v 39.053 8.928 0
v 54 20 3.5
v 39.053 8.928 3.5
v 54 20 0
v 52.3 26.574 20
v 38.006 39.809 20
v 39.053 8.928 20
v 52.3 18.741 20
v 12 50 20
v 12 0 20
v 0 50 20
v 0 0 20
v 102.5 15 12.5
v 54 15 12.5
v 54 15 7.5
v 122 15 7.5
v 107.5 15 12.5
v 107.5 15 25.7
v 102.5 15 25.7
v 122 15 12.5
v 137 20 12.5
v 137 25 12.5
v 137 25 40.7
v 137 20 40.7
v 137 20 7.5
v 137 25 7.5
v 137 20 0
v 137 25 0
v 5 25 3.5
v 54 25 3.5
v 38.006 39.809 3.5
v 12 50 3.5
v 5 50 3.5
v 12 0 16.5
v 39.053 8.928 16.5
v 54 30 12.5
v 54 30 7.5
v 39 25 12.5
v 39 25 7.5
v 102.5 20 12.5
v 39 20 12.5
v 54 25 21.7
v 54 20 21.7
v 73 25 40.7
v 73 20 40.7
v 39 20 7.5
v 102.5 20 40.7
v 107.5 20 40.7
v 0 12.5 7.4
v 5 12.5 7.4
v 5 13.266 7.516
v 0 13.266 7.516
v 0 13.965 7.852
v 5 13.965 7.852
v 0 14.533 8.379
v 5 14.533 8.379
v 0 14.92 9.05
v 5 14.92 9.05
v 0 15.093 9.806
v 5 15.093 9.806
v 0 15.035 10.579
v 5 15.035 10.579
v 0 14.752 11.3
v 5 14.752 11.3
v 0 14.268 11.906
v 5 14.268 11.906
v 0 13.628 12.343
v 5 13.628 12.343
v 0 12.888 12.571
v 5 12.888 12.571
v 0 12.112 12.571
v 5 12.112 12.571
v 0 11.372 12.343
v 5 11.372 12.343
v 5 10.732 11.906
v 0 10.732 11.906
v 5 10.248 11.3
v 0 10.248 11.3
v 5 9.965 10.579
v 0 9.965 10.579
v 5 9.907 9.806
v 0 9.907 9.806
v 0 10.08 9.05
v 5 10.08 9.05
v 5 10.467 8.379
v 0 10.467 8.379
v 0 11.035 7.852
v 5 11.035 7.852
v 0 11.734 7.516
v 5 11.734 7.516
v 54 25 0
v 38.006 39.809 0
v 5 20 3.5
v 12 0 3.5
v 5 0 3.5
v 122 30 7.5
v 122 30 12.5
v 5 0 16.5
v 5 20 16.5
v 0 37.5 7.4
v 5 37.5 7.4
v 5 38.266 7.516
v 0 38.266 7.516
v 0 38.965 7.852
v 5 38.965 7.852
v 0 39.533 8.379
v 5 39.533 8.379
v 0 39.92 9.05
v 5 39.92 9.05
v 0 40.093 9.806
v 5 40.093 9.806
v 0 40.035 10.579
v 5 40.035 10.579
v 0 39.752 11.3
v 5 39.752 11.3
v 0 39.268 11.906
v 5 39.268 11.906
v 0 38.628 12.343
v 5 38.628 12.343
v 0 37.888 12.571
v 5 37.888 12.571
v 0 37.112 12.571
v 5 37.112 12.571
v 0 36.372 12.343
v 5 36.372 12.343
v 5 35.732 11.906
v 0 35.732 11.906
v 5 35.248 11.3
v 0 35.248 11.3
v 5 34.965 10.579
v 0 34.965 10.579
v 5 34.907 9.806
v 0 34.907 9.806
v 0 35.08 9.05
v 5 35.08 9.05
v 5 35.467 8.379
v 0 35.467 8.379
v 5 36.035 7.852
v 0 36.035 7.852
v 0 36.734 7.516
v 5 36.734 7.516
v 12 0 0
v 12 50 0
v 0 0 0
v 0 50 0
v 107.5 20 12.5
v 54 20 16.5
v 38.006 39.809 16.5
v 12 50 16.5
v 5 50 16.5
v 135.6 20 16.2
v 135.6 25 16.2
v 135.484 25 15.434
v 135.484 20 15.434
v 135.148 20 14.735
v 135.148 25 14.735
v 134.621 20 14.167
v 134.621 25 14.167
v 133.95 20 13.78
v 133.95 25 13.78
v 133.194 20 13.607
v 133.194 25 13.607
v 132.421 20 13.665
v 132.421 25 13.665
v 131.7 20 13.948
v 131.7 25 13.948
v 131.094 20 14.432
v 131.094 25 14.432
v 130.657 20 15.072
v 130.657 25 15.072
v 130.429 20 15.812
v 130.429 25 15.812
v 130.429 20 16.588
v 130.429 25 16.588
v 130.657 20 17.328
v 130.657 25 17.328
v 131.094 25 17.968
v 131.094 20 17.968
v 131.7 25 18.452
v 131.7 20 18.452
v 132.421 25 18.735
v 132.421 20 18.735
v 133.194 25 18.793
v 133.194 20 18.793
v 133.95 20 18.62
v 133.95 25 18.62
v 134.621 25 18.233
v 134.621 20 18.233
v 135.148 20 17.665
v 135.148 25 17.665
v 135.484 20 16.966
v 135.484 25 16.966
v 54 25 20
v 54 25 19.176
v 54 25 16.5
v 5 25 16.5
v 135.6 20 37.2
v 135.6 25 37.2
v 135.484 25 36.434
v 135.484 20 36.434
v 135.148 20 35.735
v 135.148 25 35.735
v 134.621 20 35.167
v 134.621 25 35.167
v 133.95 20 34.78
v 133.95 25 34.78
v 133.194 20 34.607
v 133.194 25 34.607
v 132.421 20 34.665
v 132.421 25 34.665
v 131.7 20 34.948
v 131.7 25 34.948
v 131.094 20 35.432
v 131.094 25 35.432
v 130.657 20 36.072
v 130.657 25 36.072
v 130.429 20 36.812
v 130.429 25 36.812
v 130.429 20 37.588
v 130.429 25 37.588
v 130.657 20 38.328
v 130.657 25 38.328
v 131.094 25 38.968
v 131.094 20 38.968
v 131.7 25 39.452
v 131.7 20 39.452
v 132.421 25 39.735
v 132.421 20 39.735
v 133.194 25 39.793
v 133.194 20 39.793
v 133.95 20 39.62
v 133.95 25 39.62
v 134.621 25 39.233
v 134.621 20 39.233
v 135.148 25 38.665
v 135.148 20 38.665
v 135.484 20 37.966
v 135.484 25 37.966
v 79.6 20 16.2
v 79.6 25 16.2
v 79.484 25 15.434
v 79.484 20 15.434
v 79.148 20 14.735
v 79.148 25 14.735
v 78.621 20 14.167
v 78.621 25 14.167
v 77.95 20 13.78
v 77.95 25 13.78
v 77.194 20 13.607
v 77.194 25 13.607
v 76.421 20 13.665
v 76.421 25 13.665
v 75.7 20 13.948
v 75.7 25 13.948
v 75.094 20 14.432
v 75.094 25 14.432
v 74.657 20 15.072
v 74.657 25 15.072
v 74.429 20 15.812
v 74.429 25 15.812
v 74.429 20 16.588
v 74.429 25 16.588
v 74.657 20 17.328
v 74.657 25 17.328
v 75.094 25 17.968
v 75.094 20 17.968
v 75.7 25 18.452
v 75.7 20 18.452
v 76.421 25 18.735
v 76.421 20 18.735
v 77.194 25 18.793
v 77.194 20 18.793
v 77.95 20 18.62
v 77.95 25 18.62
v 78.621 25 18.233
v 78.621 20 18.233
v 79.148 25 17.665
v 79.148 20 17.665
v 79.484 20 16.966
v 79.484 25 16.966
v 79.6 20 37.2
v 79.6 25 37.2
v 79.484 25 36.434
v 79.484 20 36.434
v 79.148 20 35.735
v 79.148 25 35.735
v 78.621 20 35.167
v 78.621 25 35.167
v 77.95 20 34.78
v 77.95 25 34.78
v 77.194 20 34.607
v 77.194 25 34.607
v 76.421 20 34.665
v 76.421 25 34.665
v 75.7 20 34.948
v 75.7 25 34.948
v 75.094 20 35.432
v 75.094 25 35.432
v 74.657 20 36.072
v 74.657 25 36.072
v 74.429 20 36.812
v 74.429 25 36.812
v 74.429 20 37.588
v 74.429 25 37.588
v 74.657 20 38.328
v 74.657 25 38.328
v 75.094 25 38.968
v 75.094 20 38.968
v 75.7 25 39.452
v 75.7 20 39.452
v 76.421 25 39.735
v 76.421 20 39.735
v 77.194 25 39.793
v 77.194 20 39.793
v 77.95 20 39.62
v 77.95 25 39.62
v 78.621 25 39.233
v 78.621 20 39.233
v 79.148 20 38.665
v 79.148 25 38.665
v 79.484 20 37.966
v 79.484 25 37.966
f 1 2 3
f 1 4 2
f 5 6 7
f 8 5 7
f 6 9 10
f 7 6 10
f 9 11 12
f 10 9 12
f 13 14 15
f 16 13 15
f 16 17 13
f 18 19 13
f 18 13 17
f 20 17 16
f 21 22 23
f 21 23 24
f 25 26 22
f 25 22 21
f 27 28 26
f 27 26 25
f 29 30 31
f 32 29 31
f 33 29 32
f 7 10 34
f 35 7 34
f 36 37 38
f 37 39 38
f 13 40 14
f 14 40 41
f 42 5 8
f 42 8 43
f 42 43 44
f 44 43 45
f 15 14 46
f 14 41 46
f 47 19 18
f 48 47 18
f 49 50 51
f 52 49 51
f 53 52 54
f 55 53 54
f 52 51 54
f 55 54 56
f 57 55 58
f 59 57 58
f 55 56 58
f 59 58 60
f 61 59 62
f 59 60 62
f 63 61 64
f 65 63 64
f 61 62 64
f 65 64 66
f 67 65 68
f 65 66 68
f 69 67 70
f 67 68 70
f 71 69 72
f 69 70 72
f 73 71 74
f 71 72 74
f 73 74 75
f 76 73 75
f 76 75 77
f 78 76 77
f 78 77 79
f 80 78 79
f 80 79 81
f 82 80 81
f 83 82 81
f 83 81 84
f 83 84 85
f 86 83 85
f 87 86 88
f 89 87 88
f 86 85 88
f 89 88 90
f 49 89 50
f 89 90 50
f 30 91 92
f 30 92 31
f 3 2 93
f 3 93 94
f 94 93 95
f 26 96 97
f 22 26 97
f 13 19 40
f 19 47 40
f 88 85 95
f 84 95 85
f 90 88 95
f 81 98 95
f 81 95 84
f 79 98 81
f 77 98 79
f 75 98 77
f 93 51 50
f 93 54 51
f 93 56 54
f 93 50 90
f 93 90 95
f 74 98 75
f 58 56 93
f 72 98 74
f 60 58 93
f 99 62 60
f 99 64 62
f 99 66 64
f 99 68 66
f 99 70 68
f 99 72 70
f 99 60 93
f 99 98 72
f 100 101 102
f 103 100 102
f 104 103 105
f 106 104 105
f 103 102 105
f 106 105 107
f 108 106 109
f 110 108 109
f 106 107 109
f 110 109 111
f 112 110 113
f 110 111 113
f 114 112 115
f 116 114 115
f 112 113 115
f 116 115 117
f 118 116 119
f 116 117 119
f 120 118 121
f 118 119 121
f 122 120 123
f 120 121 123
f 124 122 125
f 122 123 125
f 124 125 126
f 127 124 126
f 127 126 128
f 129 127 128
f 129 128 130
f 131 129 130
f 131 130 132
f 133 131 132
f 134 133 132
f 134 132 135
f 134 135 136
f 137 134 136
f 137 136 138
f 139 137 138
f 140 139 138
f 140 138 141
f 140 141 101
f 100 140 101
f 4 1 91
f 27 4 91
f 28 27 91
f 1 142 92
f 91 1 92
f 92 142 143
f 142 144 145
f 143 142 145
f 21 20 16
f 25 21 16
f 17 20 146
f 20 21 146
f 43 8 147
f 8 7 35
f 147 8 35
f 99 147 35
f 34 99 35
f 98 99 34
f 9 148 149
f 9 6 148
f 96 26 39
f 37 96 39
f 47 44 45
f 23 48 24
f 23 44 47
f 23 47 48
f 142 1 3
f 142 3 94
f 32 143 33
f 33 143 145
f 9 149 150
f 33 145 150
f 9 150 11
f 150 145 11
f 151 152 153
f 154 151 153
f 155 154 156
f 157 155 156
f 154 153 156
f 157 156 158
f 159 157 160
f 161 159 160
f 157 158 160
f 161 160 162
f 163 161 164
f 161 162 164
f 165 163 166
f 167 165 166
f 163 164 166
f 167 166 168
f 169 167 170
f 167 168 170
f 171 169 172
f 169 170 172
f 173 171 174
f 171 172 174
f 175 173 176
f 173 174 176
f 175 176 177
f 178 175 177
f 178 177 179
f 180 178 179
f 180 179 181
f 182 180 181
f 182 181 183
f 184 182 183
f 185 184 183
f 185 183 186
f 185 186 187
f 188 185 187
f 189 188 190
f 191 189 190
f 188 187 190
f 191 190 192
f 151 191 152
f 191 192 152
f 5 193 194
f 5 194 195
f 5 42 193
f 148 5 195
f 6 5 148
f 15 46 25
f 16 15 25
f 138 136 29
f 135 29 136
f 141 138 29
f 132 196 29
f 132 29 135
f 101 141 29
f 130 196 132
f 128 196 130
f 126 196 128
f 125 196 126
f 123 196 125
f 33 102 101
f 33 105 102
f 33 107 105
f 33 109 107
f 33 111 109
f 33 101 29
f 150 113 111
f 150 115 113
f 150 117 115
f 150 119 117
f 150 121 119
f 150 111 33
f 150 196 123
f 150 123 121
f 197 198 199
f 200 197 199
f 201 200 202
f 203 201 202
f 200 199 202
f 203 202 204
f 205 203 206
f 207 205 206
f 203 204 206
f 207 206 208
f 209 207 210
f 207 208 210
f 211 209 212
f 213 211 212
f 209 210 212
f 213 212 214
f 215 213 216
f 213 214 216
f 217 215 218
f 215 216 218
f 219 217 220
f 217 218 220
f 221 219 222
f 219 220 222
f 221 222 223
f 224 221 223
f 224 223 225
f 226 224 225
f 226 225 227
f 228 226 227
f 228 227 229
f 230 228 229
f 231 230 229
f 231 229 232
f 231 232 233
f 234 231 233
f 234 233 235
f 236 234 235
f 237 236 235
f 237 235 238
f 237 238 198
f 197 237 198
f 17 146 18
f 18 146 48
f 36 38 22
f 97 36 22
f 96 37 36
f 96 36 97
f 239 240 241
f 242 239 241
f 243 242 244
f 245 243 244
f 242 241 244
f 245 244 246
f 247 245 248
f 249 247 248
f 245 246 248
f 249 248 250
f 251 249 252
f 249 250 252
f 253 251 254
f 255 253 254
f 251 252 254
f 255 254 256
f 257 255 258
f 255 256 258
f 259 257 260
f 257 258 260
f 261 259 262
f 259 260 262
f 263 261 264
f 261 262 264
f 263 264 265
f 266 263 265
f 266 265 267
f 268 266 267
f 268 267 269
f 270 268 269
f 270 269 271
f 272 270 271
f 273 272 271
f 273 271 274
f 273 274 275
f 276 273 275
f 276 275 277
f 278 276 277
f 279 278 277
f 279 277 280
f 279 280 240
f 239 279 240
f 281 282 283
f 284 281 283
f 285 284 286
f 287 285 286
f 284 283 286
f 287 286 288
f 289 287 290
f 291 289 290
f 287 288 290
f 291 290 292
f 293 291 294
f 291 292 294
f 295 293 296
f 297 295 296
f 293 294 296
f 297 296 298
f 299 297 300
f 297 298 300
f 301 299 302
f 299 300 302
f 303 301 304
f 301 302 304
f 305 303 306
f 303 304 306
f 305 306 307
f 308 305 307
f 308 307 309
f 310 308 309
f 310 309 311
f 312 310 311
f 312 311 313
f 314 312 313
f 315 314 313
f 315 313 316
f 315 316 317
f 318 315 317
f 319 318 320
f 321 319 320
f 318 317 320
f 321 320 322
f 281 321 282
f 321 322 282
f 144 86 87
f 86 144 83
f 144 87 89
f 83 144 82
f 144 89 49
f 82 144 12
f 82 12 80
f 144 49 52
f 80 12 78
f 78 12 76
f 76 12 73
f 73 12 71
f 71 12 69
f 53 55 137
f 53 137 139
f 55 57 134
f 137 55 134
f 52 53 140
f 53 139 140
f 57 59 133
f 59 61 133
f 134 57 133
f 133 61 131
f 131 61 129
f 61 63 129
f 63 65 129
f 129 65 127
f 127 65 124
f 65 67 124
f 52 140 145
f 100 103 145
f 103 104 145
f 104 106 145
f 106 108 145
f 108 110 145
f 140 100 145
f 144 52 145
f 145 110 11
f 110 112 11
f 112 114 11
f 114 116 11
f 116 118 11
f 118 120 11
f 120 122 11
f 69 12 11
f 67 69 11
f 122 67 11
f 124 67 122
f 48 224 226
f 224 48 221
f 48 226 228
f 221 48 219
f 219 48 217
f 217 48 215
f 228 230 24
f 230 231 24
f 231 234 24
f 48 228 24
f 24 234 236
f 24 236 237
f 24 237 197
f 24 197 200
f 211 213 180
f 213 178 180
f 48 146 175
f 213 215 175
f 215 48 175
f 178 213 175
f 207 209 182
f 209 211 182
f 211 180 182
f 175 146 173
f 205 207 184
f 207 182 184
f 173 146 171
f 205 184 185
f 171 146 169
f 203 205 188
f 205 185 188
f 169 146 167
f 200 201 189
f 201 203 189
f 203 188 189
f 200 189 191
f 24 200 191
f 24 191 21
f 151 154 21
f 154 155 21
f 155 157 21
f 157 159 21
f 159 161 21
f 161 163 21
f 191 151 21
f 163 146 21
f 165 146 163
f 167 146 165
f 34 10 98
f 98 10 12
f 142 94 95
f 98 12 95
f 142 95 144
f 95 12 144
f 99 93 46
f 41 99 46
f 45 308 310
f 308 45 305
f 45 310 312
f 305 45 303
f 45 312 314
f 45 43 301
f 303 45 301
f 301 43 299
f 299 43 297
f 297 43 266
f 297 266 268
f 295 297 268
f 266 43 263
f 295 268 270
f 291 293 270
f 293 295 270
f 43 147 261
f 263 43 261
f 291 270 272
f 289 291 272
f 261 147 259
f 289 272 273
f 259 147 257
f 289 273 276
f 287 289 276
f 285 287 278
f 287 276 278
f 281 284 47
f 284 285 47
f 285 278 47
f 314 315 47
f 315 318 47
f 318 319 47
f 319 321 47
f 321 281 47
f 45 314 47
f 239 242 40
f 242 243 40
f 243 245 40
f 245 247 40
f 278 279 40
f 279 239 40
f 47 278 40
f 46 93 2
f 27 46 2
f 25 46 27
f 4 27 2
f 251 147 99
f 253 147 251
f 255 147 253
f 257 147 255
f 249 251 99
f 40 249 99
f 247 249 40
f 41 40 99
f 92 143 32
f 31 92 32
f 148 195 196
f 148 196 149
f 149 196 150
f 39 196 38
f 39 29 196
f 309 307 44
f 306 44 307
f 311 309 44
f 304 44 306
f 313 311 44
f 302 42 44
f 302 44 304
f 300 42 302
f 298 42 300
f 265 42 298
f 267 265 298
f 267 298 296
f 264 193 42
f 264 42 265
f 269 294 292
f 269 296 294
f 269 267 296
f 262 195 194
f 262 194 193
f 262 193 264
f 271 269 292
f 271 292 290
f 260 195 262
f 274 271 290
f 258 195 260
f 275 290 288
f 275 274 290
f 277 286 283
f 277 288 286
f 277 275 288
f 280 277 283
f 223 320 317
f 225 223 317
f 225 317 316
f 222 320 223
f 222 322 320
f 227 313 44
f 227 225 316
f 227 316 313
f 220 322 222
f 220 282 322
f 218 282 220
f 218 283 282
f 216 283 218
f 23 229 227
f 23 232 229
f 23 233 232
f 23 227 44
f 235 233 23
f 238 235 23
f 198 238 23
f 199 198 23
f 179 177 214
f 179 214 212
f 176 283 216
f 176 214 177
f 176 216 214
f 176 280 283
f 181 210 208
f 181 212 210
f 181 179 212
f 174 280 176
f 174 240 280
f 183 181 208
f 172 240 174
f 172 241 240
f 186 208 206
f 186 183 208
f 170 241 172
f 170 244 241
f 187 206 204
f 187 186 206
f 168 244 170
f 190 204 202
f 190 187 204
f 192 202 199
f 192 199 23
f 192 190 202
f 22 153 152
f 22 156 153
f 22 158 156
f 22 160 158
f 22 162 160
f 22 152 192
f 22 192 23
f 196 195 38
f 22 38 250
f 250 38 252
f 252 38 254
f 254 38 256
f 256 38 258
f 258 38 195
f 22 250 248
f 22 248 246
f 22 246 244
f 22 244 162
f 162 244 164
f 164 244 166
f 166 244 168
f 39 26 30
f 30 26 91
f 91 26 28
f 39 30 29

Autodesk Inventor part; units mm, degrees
ref_plane "YZ Plane" through (0, 0, 0) normal (1, 0, 0) x (0, 1, 0)
ref_plane "XZ Plane" through (0, 0, 0) normal (0, 1, 0) x (-1, 0, 0)
ref_plane "XY Plane" through (0, 0, 0) normal (0, 0, 1) x (1, 0, 0)
sketch "Sketch1" plane through (0, 0, 0) normal (1, 0, 0) x (0, 1, 0)
  line L0 (0, 0) -> (50, 0)
  line L1 (50, 0) -> (50, 20)
  line L2 (50, 20) -> (0, 20)
  line L3 (0, 20) -> (0, 0)
  dimension "d0" = 50
  dimension "d1" = 20
extrude "Extrusion1" add sketch "Sketch1" along normal blind 5
sketch "Sketch2" plane through (5, 0, 0) normal (1, 0, 0) x (0, 0, -1)
  line L0 (-20, 50) -> (-20, 0) projected
  line L1 (-20, 25) -> (0, 25)
  line L2 (0, 0) -> (0, 50) projected
  line L3 (-20, 20) -> (0, 20)
  line L4 (0, 50) -> (-20, 50) construction
  line L5 (-10, 50) -> (-10, 0) construction
  line L6 (-20, 0) -> (0, 0) construction
  circle A0 centre (-10, 37.5) radius 2.6
  circle A1 centre (-10, 12.5) radius 2.6
  circle A2 centre (-10, 37.5) radius 4.625 construction
  circle A3 centre (-10, 12.5) radius 4.625 construction
  line L7 (-20, 25) -> (-16.5, 25)
  line L8 (-16.5, 25) -> (-16.5, 50)
  line L9 (-16.5, 50) -> (-20, 50)
  line L10 (-20, 50) -> (-20, 25)
  line L11 (0, 25) -> (-3.5, 25)
  line L12 (-3.5, 25) -> (-3.5, 50)
  line L13 (-3.5, 50) -> (0, 50)
  line L14 (0, 50) -> (0, 25)
  line L15 (-20, 20) -> (-16.5, 20)
  line L16 (-16.5, 20) -> (-16.5, 0)
  line L17 (-16.5, 0) -> (-20, 0)
  line L18 (-20, 0) -> (-20, 20)
  line L19 (0, 20) -> (-3.5, 20)
  line L20 (-3.5, 20) -> (-3.5, 0)
  line L21 (-3.5, 0) -> (0, 0)
  line L22 (0, 0) -> (0, 20)
  dimension "d4" = 5
  dimension "d5" = 5.2
  dimension "d6" = 5.2
  dimension "d7" = 12.5
  dimension "d8" = 12.5
  dimension "d9" = 9.25
  dimension "d10" = 9.25
  dimension "d11" = 3.5
  dimension "d12" = 3.5
  dimension "d13" = 3.5
  dimension "d14" = 3.5
extrude "Extrusion2" add sketch "Sketch2" along normal blind 49 contours L9 L8 L1 L0 | L1 L2 L3 L0 | L3 L16 L17 L0 | L12 L13 L2 L1 | L3 L2 L21 L20
chamfer "Chamfer1" distance 25 distance2 27 1 edges at (54, 50, 1.75) measured on face at (54, 23.3333, 18.8333)
chamfer "Chamfer2" distance 25 distance2 27 1 edges at (54, 50, 18.25) measured on face at (54, 23.3333, 18.8333)
chamfer "Chamfer3" distance 20 distance2 27 1 edges at (54, 0, 18.25) measured on face at (54, 15, 18.8333)
chamfer "Chamfer4" distance 20 distance2 27 1 edges at (54, 0, 1.75) measured on face at (54, 15, 1.1667)
sketch "Sketch3" plane through (54, 0, 0) normal (1, 0, 0) x (0, 0, -1)
  line L0 (0, 20) -> (-3.5, 20) projected
  line L1 (0, 20) -> (0, 25) projected
  line L2 (-3.5, 25) -> (0, 25) projected
  line L3 (-3.5, 25) -> (-16.5, 25) projected
  line L4 (-20, 25) -> (-16.5, 25) projected
  line L5 (-20, 25) -> (-20, 20) projected
  line L6 (-16.5, 20) -> (-20, 20) projected
  line L7 (-16.5, 20) -> (-3.5, 20) projected
  point P0 (0, 0)
extrude "Extrusion3" add sketch "Sketch3" along normal blind 83
sketch "Sketch4" plane through (5, 25, 16.5) normal (0, 1, 0) x (1, 0, 0)
  line L0 (132, -3.5) -> (132, 16.5) projected
  line L1 (132, 9) -> (34, 9)
  line L2 (34, 9) -> (34, 4)
  line L3 (34, 4) -> (132, 4)
  line L4 (132, 4) -> (132, 9)
  line L5 (49, 16.5) -> (132, 16.5) projected
  point P0 (-5, 16.5)
  dimension "d31" = 98
  dimension "d32" = 5
  dimension "d33" = 7.5
extrude "Extrusion4" add sketch "Sketch4" along normal blind 5
sketch "Sketch5" plane through (5, 20, 3.5) normal (0, -1, 0) x (1, 0, 0)
  line L0 (34, 9) -> (34, 4) projected
  line L1 (132, 9) -> (34, 9) projected
  line L2 (34, 4) -> (132, 4) projected
  line L3 (132, 16.5) -> (132, -3.5) projected
  point P0 (-5, -3.5)
extrude "Extrusion5" add sketch "Sketch5" along normal blind 5
chamfer "Chamfer5" distance 15 distance2 5 1 edges at (137, 30, 10) measured on face at (104.3333, 30, 10.8333)
chamfer "Chamfer6" distance 15 distance2 5 1 edges at (39, 30, 10) measured on face at (94.3333, 30, 10.8333)
chamfer "Chamfer7" distance 15 distance2 5 1 edges at (137, 15, 10) measured on face at (104.3333, 15, 9.1667)
chamfer "Chamfer8" distance 15 distance2 5 1 edges at (39, 15, 10) measured on face at (94.3333, 15, 9.1667)
sketch "Sketch6" plane through (5, 0, 0) normal (1, 0, 0) x (0, 0, -1)
  line L0 (-3.5, 50) -> (-16.5, 50) construction
  line L1 (-10, 50) -> (-10, 0) construction
  line L2 (-20, 0) -> (0, 0) construction
  circle A0 centre (-10, 37.5) radius 2.6
  circle A1 centre (-10, 12.5) radius 2.6
  dimension "d50" = 5.2
  dimension "d51" = 5.2
  dimension "d52" = 12.5
  dimension "d53" = 12.5
extrude "Extrusion6" cut sketch "Sketch6" against normal up to next
sketch "Sketch7" plane through (0, 0, 20) normal (0, 0, 1) x (1, 0, 0)
  line L0 (39, 20) -> (137, 20) projected
  line L1 (39, 25) -> (137, 25) projected
  line L2 (137, 20) -> (73, 20)
  line L3 (73, 20) -> (73, 25)
  line L4 (73, 25) -> (137, 25)
  line L5 (137, 25) -> (137, 20)
  point P0 (0, 0)
  point P1 (73, 20)
  dimension "d56" = 64
extrude "Extrusion7" add sketch "Sketch7" along normal blind 20.7
sketch "Sketch8" plane through (5, 25, 16.5) normal (0, 1, 0) x (1, 0, 0)
  line L0 (68, -3.5) -> (68, -24.2) projected
  line L1 (68, -24.2) -> (132, -24.2)
  line L2 (132, -24.2) -> (132, 3.8)
  line L3 (132, 3.8) -> (68, 3.8)
  line L4 (68, 3.8) -> (68, -24.2)
  line L5 (72, -20.7) -> (128, -20.7) construction
  line L6 (128, -20.7) -> (128, 0.3) construction
  line L7 (128, 0.3) -> (72, 0.3) construction
  line L8 (72, 0.3) -> (72, -20.7) construction
  circle A0 centre (72, -20.7) radius 2.6
  circle A1 centre (72, 0.3) radius 2.6
  circle A2 centre (128, -20.7) radius 2.6
  circle A3 centre (128, 0.3) radius 2.6
  point P0 (-5, 16.5)
  dimension "d59" = 64
  dimension "d60" = 28
  dimension "d61" = 56
  dimension "d62" = 21
  dimension "d63" = 3.5
  dimension "d64" = 4
  dimension "d65" = 5.2
  dimension "d66" = 5.2
  dimension "d67" = 5.2
  dimension "d68" = 5.2
extrude "Extrusion8" cut sketch "Sketch8" against normal up to next contours A0 | A1 | A2 | A3
sketch "Sketch9" plane through (5, 20, 3.5) normal (0, -1, 0) x (1, 0, 0)
  line L0 (68, 37.2) -> (132, 37.2) projected
  line L1 (117, 9) -> (49, 9) projected
  line L2 (102.5, 37.2) -> (97.5, 37.2)
  line L3 (97.5, 37.2) -> (97.5, 9)
  line L4 (97.5, 9) -> (102.5, 9)
  line L5 (102.5, 9) -> (102.5, 37.2)
  line L6 (132, 9) -> (132, 37.2) projected
  point P0 (-5, -3.5)
  point P1 (102.5, 9)
  dimension "d71" = 5
  dimension "d72" = 29.5
extrude "Extrusion9" add sketch "Sketch9" along normal blind 5
chamfer "Chamfer9" distance 15 distance2 5 1 edges at (105, 15, 40.7) measured on face at (92.8333, 15, 9.1667)
chamfer "Chamfer10" distance 15 angle 45 4 edges at (27, 50, 18.25) (27, 50, 1.75) (27, 0, 1.75) (27, 0, 18.25)
chamfer "Chamfer11" distance 20.7 angle 45 1 edges at (73, 22.5, 20)
equation "\"d8\" = d7"
equation "\"d10\" = d9"
equation "\"d53\" = d52"
equation "\"d54\" = d51"
properties part number "Y Axis Limit Switch Mount"
